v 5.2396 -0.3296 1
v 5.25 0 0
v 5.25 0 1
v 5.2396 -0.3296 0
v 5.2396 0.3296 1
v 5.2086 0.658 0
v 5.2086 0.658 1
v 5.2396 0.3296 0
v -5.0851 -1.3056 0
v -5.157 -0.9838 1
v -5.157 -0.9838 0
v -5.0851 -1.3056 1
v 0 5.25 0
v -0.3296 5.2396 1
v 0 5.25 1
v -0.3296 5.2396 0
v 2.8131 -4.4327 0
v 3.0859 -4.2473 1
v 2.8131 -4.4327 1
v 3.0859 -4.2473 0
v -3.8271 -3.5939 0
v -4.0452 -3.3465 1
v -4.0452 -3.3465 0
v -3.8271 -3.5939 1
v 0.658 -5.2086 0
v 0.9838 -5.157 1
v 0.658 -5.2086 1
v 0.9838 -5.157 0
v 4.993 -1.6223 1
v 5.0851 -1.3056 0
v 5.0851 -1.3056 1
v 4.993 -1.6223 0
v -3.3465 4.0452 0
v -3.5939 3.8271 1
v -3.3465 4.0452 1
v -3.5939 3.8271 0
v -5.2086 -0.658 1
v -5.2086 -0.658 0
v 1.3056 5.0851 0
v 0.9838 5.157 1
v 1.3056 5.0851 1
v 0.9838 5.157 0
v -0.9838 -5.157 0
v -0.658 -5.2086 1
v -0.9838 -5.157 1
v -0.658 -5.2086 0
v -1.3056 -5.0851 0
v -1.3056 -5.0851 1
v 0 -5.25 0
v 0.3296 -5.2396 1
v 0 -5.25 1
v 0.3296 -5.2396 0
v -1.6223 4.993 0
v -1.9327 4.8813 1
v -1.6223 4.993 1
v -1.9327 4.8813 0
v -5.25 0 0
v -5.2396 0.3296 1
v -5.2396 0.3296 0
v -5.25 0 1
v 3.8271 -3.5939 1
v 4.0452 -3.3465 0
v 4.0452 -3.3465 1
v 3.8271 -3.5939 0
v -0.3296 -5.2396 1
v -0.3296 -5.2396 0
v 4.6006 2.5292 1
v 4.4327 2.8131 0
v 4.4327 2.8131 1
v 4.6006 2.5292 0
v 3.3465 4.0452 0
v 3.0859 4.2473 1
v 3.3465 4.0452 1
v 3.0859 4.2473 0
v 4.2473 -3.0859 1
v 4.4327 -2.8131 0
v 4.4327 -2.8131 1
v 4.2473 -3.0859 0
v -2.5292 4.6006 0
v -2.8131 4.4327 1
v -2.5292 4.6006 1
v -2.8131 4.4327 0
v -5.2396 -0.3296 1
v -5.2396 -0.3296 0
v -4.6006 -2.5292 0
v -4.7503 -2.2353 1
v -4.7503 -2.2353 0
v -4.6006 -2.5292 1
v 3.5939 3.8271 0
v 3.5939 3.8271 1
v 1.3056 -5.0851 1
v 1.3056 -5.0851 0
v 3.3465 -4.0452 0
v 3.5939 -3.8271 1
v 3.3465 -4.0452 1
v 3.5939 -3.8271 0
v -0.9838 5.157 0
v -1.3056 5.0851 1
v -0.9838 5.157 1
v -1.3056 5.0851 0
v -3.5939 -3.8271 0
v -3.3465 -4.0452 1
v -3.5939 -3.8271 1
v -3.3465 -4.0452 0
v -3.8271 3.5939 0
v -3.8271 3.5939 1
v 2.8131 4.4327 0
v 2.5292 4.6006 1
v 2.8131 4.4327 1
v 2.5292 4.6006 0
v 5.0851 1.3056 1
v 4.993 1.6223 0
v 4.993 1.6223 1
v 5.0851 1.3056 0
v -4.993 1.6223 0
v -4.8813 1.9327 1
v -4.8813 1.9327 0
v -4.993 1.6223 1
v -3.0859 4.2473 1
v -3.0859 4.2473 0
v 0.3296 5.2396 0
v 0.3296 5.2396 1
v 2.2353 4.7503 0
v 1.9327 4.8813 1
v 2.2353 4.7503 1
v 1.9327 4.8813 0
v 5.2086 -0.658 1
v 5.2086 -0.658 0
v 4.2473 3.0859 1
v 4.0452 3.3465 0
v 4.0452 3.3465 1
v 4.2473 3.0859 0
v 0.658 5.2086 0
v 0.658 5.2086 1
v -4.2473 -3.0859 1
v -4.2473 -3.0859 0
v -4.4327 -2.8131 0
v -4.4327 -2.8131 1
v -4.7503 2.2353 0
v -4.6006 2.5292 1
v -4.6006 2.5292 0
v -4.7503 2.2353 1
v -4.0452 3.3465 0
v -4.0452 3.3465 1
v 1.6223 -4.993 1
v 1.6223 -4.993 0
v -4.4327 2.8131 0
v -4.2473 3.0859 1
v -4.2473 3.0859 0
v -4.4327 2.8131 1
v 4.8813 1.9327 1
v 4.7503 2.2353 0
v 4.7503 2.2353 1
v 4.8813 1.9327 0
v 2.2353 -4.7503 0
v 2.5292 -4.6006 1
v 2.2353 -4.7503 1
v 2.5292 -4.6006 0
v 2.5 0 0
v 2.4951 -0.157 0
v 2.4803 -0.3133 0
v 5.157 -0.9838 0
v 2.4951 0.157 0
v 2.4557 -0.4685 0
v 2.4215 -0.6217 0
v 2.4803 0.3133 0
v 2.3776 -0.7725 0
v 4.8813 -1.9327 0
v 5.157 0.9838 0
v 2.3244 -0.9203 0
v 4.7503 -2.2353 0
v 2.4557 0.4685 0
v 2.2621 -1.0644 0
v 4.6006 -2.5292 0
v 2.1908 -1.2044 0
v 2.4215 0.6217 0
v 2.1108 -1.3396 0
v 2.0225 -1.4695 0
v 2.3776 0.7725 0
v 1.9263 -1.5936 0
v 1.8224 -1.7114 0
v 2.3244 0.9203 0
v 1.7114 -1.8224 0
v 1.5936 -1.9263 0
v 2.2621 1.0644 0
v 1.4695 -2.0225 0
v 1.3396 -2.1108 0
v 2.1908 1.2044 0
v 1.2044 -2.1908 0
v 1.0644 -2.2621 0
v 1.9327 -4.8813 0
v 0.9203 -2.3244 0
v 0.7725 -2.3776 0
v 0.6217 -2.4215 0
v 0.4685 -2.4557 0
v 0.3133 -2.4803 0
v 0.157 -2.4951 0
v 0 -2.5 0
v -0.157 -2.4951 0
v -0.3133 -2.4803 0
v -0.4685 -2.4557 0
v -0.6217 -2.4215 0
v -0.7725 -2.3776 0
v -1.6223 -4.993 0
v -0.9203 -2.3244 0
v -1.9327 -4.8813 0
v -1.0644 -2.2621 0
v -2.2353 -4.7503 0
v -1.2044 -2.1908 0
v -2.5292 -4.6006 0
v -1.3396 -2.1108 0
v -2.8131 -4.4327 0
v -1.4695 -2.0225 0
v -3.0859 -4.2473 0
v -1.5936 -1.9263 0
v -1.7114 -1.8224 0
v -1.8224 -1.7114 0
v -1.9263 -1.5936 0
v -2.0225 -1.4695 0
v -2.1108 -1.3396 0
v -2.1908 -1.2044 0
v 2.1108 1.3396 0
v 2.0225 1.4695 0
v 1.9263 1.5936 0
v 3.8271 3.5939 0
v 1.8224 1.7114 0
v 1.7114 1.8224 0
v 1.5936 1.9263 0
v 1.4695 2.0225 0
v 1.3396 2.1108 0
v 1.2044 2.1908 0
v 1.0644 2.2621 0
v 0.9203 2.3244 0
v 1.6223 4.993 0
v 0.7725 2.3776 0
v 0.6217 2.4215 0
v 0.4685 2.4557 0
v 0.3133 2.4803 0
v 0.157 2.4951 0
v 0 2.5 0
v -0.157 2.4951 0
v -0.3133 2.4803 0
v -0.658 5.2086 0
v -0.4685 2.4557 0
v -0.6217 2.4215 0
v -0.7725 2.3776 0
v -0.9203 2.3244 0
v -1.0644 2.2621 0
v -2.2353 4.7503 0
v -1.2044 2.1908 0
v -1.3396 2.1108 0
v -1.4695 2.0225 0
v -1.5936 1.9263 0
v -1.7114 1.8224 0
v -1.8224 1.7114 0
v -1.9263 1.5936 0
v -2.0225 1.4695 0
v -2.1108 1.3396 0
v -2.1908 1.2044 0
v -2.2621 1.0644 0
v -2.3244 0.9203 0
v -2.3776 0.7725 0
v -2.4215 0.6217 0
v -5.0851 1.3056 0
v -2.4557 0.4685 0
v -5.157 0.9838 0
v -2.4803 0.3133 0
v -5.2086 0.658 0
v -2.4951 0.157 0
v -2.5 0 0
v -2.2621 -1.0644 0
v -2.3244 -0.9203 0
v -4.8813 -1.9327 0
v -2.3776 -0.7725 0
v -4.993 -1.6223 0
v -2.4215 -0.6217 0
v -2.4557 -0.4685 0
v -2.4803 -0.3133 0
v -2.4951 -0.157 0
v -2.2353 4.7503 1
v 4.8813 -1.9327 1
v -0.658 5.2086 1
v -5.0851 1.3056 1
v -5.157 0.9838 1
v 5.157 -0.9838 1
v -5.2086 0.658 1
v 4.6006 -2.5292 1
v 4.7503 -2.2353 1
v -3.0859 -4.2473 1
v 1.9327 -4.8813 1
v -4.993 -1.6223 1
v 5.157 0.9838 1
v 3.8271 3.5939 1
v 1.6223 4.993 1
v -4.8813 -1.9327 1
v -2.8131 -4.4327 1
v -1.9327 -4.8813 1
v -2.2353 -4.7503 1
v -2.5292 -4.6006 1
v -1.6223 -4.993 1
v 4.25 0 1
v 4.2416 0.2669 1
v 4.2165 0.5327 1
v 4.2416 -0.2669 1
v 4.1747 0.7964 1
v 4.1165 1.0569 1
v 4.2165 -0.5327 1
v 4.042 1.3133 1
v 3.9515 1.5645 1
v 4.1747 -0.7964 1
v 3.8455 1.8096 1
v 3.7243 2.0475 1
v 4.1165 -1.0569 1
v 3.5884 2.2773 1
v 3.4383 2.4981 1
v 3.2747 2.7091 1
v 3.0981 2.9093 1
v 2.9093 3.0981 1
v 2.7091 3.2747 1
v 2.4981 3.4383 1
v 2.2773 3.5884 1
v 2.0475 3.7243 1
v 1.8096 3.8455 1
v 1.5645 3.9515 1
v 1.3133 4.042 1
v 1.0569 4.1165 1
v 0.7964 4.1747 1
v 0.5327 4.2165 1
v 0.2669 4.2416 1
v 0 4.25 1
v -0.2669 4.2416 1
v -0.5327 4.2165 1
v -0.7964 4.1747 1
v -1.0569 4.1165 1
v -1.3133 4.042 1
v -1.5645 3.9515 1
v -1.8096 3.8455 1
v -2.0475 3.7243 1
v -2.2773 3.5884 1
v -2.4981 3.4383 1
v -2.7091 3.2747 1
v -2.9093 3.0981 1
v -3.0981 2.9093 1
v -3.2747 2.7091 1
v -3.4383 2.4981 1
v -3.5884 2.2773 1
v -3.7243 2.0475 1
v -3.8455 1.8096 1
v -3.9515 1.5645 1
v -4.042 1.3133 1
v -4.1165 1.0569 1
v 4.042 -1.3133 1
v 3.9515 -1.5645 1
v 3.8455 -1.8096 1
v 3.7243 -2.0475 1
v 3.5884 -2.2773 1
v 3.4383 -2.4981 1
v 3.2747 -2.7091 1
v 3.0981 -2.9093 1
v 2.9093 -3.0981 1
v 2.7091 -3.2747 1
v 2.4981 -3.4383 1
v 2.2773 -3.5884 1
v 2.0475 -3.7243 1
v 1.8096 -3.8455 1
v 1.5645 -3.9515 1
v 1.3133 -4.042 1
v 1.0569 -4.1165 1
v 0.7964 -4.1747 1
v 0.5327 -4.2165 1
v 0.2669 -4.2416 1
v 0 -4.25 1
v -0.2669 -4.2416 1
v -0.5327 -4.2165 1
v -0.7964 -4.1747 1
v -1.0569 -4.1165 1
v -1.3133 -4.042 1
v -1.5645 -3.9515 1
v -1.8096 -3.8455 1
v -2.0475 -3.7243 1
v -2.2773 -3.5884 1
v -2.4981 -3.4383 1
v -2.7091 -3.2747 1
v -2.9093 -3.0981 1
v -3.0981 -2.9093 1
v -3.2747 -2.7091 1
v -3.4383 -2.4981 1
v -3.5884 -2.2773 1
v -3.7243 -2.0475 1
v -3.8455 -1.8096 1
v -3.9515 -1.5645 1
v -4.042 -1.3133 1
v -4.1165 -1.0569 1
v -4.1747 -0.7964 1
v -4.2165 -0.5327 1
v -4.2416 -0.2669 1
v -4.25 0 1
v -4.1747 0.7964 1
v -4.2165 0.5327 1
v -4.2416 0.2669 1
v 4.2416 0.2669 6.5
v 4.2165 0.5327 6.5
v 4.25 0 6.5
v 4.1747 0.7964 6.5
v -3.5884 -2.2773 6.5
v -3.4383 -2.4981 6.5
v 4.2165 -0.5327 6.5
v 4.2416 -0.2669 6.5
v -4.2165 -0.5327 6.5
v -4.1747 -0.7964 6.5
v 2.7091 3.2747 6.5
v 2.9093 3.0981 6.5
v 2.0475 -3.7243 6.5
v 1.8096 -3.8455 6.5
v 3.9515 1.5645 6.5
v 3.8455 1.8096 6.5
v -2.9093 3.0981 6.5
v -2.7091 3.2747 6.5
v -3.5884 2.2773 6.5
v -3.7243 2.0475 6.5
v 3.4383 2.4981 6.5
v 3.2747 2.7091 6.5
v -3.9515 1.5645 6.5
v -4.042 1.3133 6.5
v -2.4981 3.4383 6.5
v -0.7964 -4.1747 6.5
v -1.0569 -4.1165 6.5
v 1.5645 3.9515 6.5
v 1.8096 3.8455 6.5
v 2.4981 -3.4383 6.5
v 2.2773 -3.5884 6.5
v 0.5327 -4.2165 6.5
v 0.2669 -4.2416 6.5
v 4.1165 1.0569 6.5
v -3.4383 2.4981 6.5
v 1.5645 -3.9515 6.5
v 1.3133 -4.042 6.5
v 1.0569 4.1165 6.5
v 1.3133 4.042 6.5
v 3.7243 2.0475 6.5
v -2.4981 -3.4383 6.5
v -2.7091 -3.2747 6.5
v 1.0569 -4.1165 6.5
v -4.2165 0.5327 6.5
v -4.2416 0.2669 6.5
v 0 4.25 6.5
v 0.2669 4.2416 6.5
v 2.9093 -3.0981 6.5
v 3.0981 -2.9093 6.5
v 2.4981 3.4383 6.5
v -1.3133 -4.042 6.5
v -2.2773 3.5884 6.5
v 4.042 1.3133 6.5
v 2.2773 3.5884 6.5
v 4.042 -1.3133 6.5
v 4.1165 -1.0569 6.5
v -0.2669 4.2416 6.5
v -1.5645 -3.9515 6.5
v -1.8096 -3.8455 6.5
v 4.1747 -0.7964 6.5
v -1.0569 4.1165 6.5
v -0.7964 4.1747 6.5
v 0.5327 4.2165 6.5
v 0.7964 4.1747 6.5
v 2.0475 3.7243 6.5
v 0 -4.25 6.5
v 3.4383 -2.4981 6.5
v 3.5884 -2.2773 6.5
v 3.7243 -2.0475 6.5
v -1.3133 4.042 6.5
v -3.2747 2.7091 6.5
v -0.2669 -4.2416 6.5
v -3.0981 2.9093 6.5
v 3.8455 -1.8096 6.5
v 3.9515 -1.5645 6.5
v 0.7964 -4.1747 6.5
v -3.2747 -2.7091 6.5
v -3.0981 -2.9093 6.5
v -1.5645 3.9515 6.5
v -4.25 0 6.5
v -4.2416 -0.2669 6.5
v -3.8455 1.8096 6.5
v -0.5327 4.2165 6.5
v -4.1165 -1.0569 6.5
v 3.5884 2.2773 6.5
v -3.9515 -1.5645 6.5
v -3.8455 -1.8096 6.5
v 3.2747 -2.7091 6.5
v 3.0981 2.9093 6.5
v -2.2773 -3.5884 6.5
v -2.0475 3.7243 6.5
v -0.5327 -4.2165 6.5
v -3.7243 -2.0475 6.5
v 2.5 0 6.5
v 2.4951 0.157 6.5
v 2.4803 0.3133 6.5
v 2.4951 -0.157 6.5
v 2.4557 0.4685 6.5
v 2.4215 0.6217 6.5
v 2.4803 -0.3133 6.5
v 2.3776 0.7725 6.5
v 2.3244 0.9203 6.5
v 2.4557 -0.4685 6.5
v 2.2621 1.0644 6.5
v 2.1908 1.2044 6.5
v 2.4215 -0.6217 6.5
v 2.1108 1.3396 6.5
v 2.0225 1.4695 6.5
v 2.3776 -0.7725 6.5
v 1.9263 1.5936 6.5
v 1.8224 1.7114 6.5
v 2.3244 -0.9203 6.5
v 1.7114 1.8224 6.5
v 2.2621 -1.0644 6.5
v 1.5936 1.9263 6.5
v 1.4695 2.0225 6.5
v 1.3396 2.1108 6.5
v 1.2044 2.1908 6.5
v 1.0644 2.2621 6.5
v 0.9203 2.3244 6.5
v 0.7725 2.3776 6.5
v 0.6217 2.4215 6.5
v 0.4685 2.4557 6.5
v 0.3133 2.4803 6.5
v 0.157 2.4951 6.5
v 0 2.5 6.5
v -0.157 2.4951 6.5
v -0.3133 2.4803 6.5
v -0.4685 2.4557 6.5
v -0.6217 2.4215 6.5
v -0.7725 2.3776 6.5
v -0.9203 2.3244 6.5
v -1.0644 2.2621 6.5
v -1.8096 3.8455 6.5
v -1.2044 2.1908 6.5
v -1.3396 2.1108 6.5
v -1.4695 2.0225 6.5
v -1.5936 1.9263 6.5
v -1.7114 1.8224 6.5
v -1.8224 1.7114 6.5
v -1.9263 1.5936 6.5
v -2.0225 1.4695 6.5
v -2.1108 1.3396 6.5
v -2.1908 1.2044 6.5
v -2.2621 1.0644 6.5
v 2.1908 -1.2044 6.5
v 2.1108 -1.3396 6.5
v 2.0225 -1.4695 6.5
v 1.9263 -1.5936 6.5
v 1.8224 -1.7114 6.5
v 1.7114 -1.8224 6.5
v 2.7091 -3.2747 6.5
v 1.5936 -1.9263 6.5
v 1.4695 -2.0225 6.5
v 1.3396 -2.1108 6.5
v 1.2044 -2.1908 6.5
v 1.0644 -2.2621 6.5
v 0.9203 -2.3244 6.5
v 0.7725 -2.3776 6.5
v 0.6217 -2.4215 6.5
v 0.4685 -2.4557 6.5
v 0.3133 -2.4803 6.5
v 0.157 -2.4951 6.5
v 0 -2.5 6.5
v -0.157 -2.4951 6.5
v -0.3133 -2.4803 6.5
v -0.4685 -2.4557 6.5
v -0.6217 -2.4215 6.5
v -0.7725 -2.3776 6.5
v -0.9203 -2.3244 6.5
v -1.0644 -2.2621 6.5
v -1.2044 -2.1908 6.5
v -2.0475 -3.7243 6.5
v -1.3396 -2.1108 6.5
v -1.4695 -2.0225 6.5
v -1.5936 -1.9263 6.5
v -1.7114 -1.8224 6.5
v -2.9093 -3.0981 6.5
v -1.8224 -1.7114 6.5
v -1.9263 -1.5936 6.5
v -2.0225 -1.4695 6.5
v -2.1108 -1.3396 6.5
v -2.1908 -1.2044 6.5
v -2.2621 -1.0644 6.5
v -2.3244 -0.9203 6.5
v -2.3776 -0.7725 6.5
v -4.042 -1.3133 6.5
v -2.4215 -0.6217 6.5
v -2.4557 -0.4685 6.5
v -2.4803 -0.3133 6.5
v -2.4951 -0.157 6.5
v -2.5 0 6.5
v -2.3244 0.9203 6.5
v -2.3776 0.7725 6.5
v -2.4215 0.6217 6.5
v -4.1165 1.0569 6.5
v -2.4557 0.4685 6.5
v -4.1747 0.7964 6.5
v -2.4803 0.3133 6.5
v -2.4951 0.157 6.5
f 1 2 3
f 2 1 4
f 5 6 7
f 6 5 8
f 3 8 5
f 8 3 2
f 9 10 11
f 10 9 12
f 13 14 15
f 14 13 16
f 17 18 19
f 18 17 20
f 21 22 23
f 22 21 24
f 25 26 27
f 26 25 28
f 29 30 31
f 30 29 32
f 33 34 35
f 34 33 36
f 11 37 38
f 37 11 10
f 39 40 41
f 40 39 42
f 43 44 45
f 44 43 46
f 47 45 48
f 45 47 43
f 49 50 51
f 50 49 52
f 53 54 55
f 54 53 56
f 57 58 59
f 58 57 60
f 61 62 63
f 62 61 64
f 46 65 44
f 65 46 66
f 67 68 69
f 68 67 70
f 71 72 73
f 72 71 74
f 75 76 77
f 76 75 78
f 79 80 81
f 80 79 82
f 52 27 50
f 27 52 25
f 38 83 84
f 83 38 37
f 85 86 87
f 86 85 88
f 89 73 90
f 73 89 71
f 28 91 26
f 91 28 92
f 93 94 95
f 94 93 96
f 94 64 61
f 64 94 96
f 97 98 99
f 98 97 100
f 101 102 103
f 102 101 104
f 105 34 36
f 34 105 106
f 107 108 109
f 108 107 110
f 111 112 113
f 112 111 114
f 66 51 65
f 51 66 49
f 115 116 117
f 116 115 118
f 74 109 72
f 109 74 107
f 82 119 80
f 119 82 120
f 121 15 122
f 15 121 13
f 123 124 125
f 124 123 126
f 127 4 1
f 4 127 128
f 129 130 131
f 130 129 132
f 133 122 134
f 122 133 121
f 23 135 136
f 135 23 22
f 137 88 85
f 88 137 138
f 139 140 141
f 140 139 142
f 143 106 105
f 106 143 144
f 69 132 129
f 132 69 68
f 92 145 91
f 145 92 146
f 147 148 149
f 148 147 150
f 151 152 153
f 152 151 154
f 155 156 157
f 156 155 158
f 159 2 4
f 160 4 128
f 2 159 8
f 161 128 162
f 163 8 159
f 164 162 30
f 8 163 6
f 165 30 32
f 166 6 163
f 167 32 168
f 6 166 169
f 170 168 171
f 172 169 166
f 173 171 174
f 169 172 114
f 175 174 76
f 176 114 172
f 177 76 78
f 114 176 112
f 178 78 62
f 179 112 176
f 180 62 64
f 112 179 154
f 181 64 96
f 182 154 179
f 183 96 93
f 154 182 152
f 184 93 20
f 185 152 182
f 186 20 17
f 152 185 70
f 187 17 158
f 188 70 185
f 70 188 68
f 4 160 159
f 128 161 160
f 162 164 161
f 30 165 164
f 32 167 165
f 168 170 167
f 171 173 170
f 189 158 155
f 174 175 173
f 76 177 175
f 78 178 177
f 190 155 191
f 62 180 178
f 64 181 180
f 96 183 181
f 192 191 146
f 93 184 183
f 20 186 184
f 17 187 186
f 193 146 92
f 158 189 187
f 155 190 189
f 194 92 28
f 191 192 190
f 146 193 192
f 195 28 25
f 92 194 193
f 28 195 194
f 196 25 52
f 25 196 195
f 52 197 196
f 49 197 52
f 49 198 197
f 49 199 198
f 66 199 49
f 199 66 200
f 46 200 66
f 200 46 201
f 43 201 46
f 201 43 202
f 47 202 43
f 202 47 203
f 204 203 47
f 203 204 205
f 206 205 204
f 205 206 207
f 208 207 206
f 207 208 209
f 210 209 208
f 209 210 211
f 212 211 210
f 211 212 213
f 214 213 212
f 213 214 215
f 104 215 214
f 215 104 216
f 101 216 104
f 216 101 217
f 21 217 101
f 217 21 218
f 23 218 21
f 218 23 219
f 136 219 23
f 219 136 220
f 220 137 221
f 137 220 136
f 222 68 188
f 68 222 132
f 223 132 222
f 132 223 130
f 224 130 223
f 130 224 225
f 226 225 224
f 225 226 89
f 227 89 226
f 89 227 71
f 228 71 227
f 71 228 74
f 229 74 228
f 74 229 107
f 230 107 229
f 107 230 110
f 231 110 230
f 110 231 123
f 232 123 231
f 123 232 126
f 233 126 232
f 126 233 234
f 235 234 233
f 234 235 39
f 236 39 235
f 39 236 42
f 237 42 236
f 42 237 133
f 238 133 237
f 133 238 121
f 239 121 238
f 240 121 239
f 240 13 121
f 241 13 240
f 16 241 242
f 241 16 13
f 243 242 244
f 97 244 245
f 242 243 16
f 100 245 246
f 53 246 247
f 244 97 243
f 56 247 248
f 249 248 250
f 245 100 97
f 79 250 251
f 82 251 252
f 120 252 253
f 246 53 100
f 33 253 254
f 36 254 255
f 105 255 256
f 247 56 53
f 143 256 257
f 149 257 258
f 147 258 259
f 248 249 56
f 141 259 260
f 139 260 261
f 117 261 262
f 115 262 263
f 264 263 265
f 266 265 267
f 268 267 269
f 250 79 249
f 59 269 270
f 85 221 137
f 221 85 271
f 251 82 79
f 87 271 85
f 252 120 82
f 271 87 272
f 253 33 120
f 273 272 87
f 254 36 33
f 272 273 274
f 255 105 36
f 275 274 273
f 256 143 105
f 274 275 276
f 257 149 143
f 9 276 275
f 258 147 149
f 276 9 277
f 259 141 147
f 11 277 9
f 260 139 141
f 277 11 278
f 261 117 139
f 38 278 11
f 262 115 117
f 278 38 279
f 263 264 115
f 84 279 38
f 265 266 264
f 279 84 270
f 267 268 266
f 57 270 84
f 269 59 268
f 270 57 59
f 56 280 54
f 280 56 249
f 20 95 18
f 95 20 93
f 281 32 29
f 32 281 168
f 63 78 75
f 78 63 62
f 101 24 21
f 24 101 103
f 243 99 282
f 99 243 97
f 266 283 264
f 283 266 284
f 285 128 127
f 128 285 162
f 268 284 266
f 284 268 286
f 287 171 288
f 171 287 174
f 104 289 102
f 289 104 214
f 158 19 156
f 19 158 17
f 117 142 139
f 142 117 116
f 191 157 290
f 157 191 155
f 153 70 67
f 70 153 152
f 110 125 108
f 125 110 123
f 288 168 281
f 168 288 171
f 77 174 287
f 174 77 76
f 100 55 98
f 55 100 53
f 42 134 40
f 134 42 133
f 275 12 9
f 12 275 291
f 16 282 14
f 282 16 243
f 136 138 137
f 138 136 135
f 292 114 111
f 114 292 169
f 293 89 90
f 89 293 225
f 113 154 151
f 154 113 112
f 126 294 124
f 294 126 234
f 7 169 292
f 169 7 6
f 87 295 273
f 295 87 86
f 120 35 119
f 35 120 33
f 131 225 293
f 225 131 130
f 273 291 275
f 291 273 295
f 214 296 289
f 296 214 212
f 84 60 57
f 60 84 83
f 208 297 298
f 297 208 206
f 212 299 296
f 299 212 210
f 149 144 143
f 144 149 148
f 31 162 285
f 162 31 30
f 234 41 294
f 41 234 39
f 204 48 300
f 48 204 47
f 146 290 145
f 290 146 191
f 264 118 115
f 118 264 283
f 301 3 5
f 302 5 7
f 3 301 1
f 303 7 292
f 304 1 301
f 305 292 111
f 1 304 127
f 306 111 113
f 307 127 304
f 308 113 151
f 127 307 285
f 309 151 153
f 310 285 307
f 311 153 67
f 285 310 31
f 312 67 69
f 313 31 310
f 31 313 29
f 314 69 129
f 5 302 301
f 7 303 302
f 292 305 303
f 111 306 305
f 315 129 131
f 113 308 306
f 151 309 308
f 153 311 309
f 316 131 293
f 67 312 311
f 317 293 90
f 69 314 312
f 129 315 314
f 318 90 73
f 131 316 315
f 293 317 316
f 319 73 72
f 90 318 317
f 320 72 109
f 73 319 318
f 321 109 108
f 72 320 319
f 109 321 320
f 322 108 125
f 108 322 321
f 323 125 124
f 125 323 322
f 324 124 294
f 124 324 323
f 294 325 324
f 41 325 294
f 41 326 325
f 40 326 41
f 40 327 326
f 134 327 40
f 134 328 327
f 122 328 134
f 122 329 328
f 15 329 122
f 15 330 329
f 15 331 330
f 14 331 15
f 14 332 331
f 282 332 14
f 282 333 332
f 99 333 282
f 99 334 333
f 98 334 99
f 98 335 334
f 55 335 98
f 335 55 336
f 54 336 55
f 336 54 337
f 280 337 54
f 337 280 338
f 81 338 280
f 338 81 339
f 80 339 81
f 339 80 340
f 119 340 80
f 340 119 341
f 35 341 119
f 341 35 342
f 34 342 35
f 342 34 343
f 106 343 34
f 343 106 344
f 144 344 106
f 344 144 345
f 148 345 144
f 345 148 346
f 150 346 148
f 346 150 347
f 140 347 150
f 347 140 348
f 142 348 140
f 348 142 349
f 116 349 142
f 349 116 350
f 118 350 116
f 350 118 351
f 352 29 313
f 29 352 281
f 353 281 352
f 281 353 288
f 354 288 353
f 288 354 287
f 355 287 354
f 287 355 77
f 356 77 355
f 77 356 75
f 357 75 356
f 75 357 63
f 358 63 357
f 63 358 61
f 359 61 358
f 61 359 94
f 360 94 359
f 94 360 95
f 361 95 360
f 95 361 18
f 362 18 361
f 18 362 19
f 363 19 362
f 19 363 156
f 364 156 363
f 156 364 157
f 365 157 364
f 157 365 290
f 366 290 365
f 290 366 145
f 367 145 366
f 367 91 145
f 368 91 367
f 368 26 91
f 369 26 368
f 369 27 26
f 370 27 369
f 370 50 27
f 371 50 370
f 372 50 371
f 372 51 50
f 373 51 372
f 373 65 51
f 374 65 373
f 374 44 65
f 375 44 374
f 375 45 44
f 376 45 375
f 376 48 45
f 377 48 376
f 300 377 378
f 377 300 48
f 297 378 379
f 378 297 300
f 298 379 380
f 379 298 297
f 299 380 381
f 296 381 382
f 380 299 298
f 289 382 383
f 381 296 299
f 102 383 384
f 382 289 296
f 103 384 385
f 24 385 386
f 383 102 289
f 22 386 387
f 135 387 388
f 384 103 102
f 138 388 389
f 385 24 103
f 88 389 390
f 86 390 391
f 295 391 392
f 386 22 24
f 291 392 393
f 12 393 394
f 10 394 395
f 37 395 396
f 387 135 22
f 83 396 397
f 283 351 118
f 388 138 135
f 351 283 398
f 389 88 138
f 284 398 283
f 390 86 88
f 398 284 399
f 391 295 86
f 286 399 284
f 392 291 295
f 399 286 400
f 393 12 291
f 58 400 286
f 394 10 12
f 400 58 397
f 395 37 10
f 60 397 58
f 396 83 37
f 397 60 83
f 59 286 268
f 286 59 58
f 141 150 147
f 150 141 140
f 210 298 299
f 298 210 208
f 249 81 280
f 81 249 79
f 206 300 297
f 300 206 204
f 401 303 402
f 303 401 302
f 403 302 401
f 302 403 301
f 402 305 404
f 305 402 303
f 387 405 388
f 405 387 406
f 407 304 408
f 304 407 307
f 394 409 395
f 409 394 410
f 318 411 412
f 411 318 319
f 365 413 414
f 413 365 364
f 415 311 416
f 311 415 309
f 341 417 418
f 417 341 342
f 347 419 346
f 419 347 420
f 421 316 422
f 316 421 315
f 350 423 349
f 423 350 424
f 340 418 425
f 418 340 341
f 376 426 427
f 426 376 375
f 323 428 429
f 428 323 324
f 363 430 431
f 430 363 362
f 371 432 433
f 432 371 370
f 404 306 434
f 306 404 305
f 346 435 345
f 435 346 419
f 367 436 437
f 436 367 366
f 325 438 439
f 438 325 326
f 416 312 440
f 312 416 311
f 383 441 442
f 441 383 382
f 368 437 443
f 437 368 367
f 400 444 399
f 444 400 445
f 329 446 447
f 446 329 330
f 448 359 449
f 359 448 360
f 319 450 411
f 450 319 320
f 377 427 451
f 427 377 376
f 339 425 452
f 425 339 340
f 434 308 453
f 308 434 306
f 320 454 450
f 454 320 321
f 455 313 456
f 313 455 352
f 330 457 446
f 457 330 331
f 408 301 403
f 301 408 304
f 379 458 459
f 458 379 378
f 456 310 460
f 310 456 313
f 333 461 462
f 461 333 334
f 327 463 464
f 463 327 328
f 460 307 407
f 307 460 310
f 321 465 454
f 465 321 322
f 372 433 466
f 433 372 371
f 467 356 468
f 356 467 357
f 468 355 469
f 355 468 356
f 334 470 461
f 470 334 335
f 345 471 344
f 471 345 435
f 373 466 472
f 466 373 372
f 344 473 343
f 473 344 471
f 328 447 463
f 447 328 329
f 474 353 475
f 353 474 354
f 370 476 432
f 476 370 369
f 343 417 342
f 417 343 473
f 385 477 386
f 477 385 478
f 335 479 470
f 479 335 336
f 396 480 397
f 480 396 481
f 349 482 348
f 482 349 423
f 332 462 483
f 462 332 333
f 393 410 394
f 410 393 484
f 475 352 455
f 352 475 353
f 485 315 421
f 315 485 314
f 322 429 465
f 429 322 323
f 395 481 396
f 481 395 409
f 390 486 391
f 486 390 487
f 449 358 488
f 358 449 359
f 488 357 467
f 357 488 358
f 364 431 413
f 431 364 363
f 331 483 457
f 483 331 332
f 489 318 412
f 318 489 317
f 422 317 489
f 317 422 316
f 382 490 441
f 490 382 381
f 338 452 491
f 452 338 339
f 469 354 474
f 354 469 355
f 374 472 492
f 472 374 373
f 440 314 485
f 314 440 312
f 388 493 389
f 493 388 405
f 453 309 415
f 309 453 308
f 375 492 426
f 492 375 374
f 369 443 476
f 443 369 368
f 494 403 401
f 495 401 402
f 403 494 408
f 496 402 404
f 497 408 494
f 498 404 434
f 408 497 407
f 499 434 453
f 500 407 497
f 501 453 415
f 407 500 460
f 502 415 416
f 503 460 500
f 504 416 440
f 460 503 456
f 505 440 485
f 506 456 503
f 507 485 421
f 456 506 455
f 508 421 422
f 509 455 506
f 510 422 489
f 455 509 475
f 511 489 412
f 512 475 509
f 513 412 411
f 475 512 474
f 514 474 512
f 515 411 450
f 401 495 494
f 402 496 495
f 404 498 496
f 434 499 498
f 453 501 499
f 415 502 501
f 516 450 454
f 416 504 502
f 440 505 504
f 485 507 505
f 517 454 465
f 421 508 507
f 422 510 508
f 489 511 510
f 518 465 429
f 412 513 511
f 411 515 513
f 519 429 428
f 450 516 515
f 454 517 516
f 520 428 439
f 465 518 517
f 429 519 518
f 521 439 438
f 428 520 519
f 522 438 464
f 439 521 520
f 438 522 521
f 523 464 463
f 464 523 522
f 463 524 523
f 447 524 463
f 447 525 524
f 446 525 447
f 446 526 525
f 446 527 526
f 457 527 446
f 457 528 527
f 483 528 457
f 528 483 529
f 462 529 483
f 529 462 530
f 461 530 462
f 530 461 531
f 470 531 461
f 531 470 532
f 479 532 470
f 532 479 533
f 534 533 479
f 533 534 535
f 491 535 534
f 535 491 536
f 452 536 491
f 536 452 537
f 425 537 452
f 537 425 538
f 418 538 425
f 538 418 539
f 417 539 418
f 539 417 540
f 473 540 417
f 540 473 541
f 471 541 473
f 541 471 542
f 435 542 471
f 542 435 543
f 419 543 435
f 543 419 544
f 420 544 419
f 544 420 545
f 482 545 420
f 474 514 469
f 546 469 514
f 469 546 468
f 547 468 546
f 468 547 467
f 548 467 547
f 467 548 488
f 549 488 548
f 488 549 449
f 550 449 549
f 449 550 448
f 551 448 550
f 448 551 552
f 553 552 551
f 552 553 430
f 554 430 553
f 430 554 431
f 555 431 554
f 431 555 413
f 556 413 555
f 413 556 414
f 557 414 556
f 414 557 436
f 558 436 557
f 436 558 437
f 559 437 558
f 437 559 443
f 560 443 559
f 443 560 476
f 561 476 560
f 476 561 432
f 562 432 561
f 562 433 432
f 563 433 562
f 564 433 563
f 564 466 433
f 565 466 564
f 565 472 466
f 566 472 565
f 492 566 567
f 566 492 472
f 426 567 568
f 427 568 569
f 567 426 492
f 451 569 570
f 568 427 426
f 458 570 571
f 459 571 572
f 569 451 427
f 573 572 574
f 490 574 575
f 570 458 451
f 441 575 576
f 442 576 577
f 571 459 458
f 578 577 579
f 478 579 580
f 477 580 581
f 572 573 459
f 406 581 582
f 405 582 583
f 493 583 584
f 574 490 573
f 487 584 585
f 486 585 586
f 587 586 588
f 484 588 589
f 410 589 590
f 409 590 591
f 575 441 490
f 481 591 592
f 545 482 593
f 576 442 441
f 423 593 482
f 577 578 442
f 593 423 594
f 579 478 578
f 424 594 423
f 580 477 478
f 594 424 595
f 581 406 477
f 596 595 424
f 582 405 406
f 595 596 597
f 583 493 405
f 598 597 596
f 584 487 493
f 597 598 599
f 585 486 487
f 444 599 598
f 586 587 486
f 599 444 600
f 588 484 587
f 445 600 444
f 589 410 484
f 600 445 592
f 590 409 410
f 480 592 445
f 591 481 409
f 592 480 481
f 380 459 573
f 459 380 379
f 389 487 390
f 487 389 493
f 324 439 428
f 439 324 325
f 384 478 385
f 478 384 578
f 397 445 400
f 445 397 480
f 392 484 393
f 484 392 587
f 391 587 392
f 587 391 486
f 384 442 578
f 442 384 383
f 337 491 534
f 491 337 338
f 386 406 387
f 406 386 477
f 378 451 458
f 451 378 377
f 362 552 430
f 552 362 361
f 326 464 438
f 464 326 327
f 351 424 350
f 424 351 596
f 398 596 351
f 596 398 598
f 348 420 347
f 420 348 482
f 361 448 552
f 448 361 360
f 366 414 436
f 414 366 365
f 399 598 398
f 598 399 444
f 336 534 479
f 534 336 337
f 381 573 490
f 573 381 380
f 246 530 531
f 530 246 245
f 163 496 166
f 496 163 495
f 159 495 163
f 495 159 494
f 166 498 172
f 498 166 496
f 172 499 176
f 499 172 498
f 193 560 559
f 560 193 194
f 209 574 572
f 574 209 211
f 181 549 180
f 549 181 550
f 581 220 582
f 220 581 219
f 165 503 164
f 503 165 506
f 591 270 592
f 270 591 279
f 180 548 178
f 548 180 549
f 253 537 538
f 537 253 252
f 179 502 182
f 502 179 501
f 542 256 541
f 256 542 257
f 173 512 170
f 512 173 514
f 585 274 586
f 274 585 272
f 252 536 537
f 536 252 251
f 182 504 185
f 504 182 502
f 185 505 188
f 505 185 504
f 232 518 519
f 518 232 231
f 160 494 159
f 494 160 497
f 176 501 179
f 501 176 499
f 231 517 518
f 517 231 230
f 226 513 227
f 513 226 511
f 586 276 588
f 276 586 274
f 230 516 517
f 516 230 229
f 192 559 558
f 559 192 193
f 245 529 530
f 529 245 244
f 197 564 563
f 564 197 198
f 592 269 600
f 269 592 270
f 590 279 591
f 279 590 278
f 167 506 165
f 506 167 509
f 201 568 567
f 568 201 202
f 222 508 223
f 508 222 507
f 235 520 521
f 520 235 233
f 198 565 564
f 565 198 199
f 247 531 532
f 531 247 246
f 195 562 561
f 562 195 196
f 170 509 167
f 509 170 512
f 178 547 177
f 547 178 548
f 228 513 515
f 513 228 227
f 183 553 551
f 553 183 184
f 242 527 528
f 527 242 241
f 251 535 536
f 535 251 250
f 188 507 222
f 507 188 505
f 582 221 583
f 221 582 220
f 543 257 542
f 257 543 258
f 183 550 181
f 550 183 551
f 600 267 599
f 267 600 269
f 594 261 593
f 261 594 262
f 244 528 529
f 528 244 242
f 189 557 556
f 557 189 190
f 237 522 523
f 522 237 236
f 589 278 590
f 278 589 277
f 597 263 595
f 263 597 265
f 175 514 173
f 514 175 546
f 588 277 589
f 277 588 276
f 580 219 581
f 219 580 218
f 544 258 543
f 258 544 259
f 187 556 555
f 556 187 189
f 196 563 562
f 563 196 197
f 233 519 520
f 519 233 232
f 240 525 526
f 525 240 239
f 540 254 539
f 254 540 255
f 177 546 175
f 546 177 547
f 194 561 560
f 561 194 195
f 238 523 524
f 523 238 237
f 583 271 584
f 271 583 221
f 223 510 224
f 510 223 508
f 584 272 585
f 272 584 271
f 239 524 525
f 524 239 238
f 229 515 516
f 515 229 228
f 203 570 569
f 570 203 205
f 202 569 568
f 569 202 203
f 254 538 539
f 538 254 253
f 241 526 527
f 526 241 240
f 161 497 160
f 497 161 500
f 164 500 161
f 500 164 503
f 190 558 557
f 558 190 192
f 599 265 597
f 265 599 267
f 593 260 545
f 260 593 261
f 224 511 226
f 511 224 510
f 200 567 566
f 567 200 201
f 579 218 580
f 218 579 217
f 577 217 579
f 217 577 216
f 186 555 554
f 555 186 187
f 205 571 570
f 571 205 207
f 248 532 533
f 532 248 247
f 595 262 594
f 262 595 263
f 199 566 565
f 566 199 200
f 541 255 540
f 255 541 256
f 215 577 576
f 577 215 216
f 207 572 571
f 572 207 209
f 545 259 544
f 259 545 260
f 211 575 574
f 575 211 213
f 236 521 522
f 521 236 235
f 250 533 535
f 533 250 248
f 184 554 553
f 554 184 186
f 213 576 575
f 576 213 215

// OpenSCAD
// Fix z-fighting.
delta=0.01;

// Maximize cylinder line segements.
$fn=100;

// Typical 5mm LED.
ledd=5;
ledz=8.5;
ledrimz=1;
leddomez=1;

// Thickness of LED holder above face plate.
ledholderfacez=1;

// Faceplate model hole inner diameter.
faceplateID=8.5;


difference() {
    // Holder.
    ledholder();

    // Led.
    translate([0, 0, -delta])
        cylinder(h=ledz-ledrimz-leddomez+2*delta, r=ledd/2);
}

module ledholder() {
    // Face.
    cylinder(h=ledholderfacez, r=faceplateID/2+1);
    
    // Body.
    cylinder(h=ledz-ledrimz-leddomez, r=faceplateID/2);

}
